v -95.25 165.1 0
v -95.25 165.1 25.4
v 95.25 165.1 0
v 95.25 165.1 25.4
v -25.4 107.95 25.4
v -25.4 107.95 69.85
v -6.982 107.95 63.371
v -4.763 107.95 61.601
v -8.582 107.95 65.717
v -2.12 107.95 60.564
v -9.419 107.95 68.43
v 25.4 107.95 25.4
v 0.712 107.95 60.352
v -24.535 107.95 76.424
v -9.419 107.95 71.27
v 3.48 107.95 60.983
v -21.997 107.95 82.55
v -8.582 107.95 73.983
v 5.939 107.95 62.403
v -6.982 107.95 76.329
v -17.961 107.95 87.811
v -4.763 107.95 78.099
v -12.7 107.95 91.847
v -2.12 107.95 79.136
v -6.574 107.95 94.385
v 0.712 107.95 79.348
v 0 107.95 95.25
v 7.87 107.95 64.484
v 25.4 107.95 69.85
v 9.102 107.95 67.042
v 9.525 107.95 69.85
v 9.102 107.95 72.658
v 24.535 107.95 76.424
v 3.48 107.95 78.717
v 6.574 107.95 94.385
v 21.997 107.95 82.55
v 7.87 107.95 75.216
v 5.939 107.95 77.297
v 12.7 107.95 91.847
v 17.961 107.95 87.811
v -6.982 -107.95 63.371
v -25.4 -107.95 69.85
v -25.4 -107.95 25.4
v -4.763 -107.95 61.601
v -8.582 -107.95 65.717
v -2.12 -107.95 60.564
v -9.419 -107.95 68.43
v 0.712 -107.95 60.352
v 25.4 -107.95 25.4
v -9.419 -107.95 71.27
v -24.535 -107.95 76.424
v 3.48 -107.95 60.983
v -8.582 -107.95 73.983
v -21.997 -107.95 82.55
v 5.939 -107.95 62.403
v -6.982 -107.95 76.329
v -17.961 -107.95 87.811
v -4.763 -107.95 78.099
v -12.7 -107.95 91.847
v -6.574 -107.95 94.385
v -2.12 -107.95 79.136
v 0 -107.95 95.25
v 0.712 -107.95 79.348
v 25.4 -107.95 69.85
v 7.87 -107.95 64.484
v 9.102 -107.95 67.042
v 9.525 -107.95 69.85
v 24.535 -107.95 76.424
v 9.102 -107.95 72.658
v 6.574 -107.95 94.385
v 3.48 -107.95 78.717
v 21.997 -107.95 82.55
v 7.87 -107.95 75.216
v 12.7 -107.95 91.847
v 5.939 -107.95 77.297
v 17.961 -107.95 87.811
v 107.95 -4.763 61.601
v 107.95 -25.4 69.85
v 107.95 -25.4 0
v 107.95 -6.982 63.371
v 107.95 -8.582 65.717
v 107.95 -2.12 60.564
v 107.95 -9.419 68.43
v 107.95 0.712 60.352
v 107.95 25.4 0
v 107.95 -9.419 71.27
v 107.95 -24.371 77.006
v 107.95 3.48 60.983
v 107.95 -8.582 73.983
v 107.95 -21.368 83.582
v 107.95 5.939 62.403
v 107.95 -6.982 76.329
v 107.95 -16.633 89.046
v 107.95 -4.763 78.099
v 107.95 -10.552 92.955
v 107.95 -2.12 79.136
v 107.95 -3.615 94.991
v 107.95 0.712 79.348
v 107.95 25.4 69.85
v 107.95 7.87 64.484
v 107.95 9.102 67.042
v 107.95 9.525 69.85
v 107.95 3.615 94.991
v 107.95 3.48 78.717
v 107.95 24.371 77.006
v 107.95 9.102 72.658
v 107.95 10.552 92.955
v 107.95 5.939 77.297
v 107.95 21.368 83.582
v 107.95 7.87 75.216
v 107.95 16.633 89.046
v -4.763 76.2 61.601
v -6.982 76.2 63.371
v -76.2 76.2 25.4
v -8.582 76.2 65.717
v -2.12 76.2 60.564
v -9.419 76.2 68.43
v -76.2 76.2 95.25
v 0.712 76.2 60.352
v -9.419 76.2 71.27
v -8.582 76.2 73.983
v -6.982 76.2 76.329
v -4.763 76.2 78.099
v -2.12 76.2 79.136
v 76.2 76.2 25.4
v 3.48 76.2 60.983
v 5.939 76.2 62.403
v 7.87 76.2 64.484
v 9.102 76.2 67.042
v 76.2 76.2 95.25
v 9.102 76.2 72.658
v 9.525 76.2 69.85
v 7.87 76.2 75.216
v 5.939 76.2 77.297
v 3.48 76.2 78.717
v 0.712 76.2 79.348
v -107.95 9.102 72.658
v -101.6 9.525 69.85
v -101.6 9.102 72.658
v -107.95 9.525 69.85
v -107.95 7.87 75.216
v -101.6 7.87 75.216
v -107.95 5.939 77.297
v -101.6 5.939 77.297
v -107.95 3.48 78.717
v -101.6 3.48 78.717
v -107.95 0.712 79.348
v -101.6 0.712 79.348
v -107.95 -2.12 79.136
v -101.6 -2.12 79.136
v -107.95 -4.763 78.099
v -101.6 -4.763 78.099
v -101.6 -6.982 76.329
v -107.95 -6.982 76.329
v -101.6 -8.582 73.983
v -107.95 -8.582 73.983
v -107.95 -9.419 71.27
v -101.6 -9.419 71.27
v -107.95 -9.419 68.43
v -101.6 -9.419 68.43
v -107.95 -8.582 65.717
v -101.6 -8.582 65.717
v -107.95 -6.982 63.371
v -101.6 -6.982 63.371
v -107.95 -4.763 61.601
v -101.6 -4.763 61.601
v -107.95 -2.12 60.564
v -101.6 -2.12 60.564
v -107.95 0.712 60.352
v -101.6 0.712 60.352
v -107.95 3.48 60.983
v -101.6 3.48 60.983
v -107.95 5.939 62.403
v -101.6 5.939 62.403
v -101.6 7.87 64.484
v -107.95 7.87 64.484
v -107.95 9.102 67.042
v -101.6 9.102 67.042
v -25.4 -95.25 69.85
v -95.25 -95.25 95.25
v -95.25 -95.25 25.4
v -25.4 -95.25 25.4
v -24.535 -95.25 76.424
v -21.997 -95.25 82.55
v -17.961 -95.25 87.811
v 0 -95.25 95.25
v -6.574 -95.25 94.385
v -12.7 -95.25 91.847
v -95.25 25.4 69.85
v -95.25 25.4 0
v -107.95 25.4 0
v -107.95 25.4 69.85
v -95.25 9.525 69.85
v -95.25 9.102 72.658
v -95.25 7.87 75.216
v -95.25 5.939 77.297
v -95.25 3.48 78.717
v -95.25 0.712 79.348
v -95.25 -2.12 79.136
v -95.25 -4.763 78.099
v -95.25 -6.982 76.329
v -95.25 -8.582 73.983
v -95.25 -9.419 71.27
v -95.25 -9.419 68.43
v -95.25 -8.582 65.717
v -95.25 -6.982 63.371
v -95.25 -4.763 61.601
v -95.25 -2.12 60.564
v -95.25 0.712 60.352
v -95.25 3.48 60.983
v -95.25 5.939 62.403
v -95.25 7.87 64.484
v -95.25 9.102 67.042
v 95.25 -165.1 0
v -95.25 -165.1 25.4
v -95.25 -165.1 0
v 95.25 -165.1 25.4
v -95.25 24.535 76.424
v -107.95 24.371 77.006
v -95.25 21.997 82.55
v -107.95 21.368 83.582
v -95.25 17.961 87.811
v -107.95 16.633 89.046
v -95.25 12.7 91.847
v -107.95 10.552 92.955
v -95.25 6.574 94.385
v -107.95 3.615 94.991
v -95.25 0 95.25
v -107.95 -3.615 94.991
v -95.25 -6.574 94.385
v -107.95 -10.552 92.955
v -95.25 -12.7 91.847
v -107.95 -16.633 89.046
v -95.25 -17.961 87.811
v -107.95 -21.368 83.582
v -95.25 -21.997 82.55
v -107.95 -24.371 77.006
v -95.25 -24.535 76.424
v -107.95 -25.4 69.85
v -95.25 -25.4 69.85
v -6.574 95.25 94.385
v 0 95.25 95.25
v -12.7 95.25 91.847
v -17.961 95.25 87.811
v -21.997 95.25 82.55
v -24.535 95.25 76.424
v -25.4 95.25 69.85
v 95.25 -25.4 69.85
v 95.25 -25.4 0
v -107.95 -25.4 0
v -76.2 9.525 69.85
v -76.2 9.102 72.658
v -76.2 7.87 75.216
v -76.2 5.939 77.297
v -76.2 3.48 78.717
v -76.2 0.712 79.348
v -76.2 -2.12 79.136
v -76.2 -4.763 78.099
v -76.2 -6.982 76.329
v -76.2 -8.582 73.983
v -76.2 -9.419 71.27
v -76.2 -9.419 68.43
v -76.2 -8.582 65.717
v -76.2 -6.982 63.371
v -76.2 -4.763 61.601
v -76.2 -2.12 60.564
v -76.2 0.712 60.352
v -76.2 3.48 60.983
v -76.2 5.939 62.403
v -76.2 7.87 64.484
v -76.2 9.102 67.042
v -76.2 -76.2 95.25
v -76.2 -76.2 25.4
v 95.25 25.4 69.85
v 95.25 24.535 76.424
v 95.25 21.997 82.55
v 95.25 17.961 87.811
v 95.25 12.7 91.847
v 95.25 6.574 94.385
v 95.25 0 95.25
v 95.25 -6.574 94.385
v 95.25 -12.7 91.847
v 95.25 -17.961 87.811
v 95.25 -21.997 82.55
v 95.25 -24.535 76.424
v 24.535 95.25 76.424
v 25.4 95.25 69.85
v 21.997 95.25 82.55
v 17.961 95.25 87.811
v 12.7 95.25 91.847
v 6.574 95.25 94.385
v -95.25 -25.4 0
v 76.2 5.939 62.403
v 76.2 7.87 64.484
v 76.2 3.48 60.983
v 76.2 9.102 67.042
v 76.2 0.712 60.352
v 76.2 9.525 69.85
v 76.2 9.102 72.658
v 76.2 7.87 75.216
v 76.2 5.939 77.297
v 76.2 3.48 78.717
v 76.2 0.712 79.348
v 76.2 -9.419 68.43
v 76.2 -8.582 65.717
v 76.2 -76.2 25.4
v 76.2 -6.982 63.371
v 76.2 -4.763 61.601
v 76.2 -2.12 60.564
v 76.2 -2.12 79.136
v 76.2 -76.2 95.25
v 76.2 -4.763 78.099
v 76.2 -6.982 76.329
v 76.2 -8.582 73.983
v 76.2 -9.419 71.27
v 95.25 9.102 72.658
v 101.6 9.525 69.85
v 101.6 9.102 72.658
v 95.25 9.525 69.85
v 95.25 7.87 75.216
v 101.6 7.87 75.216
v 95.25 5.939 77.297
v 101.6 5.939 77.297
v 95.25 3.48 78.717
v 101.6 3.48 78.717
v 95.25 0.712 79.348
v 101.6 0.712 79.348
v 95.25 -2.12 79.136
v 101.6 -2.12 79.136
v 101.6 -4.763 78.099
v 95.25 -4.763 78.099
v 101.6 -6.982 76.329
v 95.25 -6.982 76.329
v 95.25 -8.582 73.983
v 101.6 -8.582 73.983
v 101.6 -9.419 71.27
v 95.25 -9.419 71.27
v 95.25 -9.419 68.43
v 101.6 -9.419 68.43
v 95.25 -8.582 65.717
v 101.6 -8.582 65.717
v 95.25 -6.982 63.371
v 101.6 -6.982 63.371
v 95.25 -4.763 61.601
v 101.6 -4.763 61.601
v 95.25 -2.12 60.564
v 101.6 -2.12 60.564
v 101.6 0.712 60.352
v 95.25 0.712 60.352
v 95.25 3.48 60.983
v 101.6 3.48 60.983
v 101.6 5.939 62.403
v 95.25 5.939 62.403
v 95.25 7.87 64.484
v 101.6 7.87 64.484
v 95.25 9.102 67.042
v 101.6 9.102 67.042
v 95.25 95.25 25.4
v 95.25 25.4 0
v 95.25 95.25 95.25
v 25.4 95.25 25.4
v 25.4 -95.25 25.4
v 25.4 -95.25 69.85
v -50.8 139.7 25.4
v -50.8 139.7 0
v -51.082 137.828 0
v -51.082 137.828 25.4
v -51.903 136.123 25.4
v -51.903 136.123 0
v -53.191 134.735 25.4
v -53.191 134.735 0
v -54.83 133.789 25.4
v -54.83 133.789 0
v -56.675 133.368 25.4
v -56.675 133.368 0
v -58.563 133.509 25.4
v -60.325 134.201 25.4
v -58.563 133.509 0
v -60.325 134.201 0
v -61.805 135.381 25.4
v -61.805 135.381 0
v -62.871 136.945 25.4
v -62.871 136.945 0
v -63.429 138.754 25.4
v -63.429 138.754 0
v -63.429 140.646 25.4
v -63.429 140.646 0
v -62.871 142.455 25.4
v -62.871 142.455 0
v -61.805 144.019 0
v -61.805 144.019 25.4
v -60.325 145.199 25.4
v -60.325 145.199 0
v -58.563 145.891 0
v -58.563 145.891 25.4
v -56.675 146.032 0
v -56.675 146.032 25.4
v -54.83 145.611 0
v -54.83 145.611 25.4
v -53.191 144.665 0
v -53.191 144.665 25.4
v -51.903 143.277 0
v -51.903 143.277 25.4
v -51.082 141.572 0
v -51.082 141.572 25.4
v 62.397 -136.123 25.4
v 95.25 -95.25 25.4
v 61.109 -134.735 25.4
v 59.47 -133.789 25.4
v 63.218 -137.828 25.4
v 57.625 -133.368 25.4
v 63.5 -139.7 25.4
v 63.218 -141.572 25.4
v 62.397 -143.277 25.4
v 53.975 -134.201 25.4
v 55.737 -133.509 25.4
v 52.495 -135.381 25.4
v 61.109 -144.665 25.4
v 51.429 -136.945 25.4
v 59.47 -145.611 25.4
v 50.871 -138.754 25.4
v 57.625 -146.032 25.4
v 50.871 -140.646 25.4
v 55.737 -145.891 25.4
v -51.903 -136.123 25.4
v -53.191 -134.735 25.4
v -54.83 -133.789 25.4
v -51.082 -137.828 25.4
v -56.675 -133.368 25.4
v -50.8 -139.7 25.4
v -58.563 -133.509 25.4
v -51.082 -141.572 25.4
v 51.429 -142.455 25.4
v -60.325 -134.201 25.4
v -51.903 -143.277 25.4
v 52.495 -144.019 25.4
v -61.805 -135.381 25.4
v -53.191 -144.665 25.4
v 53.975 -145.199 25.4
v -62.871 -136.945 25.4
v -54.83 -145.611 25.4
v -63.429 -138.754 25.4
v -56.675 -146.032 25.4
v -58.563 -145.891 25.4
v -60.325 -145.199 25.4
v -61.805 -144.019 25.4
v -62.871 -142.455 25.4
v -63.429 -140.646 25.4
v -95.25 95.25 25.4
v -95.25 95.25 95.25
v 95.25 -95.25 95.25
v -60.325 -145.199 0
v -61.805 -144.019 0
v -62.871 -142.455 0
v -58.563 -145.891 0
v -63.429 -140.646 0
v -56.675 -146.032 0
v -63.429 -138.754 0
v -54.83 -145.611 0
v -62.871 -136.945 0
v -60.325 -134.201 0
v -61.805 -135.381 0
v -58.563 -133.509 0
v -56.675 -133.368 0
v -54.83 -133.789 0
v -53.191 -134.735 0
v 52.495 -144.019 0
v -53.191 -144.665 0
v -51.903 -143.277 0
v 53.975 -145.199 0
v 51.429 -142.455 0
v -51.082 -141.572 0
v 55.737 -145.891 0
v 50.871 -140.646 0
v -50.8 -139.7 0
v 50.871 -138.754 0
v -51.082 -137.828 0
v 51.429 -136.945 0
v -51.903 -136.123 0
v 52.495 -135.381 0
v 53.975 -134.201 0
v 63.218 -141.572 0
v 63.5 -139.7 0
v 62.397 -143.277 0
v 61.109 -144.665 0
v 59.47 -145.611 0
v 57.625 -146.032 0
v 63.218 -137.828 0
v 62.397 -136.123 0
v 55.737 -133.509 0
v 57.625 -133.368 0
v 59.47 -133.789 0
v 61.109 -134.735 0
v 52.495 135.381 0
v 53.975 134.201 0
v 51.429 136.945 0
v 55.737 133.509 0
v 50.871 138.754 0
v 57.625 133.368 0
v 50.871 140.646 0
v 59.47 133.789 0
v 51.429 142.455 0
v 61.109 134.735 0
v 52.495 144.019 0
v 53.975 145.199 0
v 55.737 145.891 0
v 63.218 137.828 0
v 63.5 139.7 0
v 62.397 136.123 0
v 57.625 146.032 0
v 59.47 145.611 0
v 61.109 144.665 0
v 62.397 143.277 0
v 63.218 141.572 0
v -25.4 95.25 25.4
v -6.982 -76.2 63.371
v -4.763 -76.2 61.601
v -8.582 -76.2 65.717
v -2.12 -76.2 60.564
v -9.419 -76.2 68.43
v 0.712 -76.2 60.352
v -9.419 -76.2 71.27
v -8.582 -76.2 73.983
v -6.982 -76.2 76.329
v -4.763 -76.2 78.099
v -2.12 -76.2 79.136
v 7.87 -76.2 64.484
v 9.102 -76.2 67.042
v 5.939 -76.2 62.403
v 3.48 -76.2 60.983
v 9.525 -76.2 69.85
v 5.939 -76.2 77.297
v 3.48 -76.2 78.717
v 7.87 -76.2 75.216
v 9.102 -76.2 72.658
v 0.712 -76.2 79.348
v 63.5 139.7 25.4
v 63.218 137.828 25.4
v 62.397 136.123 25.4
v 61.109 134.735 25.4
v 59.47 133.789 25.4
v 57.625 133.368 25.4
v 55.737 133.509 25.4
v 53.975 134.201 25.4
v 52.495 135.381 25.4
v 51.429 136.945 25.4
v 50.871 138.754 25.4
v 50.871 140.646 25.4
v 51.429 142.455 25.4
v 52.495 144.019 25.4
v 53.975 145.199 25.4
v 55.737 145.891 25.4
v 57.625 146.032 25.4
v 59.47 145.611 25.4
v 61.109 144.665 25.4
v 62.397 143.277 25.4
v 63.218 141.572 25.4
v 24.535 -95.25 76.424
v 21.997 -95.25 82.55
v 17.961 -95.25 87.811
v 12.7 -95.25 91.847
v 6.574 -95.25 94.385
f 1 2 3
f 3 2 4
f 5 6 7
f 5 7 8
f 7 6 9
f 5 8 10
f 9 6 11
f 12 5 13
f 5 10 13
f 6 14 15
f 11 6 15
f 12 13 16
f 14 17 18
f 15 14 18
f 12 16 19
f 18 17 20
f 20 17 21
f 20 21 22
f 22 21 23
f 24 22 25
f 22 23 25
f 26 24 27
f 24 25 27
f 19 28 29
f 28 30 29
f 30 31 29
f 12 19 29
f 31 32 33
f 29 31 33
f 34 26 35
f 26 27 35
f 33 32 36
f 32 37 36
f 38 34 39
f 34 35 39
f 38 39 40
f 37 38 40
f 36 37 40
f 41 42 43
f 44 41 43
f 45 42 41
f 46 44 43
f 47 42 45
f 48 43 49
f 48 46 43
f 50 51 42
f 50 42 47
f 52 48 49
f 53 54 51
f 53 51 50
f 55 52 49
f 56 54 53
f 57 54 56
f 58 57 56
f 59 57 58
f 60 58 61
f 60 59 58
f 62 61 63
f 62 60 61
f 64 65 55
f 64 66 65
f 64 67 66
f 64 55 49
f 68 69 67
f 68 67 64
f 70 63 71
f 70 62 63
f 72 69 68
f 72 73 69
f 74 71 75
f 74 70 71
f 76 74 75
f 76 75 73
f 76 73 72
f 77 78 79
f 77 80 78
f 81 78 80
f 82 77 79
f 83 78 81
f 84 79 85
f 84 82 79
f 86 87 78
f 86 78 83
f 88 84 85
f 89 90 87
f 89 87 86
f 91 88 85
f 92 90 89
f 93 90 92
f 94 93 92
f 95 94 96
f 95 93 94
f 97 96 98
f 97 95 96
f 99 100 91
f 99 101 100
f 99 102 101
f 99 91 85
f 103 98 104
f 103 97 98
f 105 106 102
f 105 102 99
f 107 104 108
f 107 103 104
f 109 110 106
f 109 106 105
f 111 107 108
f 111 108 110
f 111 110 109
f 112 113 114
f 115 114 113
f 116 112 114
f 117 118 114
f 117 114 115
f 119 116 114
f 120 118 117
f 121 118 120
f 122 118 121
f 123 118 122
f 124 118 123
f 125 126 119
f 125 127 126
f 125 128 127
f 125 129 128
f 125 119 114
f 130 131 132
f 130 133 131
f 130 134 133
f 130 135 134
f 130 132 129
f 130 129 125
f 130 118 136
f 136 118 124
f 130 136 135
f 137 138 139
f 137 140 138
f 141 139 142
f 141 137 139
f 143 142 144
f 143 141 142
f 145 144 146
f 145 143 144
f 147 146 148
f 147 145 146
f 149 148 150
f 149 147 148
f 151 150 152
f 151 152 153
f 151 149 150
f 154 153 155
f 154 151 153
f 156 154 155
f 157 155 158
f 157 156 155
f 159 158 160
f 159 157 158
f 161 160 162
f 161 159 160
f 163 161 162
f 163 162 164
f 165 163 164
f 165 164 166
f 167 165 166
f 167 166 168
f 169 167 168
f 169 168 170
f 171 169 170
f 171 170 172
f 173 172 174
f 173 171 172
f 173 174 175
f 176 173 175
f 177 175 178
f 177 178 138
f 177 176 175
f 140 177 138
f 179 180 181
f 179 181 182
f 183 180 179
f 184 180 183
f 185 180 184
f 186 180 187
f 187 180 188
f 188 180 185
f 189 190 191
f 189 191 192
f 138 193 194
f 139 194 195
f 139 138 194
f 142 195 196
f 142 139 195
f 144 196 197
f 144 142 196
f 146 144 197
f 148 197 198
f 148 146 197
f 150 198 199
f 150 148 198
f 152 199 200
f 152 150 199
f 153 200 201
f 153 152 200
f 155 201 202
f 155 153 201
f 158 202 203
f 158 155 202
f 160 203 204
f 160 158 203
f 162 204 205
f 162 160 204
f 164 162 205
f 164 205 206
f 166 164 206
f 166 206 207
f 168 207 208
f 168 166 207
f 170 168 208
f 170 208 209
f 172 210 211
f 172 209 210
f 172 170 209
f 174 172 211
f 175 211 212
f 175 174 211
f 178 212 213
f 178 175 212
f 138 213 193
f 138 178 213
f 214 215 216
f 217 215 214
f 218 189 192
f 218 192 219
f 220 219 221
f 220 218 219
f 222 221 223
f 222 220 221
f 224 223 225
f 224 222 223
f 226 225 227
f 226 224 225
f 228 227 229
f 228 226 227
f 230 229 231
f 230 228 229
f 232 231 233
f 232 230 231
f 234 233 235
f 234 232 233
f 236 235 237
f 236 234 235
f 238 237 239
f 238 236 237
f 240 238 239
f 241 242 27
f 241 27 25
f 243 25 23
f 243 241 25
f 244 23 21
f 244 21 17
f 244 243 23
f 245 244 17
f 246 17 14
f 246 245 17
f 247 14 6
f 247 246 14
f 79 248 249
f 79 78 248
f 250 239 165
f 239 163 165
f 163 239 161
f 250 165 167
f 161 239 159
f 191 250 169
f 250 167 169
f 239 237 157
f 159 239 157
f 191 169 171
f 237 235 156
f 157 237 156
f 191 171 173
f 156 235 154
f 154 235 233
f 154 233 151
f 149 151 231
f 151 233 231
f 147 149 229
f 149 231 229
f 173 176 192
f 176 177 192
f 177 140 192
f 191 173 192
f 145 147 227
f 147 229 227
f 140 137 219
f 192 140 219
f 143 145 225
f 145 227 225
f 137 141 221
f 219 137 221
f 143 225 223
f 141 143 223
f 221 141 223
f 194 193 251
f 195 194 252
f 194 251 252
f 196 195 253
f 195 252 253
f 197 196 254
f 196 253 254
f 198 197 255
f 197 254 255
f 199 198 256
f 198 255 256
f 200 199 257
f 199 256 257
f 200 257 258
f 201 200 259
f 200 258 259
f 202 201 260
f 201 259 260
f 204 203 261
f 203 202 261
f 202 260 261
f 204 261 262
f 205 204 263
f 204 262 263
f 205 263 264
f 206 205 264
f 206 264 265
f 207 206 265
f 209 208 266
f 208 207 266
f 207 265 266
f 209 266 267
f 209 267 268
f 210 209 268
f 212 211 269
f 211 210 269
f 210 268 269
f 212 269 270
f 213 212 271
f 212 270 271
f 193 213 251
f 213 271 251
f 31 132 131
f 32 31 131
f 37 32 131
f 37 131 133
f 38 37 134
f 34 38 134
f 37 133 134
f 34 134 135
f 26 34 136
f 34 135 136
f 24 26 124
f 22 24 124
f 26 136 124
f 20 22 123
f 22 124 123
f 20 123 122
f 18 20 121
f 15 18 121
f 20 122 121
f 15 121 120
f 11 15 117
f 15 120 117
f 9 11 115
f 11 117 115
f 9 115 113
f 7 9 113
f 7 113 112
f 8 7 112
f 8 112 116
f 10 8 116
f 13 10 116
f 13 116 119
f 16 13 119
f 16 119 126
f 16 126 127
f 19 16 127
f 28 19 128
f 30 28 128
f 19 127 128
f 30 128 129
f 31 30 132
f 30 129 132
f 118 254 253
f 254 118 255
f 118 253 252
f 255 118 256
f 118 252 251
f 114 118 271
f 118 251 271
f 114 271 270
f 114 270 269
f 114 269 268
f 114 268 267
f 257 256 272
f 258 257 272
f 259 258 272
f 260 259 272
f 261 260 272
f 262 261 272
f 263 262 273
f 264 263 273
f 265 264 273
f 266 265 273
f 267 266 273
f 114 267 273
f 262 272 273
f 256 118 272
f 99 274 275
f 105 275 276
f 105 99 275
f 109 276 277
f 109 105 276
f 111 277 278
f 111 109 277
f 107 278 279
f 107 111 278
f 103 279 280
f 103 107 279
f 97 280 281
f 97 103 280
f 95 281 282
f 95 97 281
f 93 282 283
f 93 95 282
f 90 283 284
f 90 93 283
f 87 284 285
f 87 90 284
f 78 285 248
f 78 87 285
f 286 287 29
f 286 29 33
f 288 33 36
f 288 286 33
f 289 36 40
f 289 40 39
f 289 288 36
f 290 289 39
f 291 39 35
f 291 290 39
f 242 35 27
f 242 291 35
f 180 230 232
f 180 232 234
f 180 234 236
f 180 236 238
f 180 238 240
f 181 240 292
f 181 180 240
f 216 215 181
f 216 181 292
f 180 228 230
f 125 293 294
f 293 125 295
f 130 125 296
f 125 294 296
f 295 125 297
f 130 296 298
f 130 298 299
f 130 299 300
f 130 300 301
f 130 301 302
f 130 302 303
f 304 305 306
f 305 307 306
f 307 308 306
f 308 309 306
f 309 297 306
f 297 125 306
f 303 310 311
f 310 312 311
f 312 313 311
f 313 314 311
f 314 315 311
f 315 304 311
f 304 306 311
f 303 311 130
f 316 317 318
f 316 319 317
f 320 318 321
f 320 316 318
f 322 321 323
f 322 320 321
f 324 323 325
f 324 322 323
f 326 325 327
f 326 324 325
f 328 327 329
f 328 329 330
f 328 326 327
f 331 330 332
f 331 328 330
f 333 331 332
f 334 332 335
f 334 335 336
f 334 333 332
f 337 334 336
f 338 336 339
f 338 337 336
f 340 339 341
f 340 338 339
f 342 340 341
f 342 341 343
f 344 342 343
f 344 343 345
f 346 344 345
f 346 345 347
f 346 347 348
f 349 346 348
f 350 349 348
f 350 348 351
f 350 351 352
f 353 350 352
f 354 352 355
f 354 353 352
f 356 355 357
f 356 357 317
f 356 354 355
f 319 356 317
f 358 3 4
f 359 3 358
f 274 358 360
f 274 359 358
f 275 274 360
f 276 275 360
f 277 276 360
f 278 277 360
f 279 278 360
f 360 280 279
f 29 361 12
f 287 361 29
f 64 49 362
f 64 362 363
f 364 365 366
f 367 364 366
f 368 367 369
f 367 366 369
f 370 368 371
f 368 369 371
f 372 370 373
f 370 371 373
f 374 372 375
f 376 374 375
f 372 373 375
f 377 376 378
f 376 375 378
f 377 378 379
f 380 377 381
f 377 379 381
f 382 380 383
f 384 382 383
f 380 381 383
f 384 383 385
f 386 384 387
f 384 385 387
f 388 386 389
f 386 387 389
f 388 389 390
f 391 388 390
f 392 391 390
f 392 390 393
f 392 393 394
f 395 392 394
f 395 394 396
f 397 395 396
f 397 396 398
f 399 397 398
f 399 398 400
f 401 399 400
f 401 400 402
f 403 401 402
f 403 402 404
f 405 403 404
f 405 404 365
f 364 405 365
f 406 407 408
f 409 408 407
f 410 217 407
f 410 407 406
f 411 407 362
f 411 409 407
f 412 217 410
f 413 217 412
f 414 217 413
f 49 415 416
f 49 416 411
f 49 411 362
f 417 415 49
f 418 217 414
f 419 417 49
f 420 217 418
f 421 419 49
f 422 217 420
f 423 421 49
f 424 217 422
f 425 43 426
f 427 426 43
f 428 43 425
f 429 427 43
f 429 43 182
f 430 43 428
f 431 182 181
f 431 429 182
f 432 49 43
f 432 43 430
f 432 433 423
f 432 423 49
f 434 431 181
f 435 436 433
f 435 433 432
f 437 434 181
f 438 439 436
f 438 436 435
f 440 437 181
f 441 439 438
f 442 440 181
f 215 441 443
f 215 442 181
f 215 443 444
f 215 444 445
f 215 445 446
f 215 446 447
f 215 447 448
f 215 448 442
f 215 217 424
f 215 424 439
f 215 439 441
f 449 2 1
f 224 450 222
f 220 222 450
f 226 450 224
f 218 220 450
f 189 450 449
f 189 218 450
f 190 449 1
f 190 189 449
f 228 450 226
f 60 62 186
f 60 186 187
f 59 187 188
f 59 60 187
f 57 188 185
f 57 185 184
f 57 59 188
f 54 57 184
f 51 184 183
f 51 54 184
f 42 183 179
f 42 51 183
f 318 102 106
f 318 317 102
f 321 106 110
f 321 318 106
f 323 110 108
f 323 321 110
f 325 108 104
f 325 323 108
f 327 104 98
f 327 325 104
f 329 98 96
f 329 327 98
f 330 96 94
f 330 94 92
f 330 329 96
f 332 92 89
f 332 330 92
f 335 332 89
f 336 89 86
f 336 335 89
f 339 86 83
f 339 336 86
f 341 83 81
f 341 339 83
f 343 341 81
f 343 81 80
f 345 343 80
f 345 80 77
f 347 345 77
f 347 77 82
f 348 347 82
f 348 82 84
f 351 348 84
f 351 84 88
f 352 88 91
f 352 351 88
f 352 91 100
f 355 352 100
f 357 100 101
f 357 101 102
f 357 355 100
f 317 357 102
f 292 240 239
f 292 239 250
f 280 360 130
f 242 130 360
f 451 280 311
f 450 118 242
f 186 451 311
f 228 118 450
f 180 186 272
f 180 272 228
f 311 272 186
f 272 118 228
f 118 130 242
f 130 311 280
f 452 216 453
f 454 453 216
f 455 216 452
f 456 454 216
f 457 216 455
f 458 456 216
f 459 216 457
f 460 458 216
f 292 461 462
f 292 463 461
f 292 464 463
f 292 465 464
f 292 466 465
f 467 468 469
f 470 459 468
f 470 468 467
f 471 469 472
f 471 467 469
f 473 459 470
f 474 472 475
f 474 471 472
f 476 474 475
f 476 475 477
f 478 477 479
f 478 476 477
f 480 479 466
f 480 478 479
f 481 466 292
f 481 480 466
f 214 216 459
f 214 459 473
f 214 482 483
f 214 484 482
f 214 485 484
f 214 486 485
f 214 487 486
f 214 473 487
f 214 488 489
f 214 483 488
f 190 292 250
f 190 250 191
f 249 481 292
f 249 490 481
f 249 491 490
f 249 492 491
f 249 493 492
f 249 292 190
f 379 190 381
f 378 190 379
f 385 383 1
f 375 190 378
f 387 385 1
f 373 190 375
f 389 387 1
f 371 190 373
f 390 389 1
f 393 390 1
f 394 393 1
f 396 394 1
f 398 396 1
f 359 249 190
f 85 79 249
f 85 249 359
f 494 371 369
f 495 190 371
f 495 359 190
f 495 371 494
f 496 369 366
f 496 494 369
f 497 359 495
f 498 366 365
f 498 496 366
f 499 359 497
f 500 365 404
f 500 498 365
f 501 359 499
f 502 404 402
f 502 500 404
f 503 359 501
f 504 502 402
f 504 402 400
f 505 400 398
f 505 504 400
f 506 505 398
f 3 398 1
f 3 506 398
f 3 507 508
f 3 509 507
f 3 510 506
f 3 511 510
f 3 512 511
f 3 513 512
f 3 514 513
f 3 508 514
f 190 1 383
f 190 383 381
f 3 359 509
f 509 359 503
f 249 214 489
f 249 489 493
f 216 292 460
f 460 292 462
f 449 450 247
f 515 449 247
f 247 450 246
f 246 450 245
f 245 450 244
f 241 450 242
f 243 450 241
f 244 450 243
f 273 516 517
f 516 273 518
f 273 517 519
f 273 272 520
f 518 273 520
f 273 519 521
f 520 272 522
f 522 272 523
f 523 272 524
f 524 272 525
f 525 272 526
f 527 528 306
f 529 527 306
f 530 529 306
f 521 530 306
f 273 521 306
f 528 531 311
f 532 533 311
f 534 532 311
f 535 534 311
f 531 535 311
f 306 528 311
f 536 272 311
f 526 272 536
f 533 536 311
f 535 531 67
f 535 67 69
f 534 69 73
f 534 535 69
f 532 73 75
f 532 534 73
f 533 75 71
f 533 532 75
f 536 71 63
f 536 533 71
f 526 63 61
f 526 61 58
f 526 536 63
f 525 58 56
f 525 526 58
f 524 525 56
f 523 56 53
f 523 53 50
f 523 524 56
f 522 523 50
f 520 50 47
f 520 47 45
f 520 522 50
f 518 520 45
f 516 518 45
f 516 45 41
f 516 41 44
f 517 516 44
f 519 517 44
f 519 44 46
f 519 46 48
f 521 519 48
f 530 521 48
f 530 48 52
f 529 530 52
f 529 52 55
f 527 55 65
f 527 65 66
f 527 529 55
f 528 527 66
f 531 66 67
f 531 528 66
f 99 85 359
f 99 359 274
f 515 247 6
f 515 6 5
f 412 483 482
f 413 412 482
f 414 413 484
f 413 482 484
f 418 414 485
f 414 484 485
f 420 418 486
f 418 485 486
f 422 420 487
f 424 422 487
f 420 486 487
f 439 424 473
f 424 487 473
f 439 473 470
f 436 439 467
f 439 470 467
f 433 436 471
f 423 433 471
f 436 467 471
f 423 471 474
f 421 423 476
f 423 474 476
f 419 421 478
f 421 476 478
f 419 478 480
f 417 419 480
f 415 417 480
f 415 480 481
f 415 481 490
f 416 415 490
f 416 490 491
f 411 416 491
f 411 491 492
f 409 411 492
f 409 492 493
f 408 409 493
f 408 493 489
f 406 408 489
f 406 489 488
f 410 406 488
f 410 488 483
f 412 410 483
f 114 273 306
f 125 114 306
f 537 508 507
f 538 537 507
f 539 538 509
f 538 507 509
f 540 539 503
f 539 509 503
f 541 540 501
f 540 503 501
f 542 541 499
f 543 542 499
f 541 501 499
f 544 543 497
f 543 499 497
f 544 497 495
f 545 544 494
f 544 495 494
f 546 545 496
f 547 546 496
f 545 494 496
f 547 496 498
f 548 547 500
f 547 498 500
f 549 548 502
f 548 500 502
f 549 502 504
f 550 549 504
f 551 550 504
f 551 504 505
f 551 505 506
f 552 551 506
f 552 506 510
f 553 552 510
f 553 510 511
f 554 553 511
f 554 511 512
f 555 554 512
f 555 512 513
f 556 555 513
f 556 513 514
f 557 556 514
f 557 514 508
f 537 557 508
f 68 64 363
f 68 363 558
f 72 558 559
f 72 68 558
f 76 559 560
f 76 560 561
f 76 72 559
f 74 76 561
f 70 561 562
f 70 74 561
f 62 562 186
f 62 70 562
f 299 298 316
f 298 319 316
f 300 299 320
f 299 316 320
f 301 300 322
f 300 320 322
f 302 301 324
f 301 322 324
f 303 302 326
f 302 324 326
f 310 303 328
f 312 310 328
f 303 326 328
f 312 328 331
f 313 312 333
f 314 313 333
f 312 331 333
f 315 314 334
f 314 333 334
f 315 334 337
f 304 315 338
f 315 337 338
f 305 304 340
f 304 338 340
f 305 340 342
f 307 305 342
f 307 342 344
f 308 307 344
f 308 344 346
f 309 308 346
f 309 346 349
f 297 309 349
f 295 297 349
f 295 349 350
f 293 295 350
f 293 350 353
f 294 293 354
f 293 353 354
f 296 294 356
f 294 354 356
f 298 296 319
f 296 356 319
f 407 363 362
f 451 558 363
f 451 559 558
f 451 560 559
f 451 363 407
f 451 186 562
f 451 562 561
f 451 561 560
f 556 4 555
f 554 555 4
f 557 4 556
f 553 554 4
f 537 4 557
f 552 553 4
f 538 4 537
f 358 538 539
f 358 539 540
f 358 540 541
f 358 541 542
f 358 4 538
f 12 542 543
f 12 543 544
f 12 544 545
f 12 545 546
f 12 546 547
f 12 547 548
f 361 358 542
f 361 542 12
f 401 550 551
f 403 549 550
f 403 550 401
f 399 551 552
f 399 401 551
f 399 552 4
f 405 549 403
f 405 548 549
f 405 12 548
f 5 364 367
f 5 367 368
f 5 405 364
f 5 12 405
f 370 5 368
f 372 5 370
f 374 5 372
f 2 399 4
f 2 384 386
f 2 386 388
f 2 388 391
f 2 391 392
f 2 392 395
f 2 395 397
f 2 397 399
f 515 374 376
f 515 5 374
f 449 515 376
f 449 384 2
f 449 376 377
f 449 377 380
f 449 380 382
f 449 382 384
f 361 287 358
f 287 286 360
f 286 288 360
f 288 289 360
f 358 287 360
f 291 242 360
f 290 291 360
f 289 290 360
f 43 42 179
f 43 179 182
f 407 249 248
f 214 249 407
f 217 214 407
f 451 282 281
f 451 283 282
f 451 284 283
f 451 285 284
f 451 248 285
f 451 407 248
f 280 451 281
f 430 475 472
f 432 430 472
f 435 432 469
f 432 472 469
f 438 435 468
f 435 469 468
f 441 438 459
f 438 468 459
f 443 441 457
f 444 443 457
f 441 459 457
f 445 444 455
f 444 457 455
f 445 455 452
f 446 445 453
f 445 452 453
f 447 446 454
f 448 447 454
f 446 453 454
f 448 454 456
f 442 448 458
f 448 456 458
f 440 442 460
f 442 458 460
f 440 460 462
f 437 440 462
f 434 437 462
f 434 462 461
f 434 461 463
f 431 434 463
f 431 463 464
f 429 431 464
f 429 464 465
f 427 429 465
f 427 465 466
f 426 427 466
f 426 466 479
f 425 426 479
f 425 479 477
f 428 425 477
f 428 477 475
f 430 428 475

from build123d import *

# Parameters (mm, degrees)
F1_DEPTH = 165.1
F0_W     = 19.05
F0_H     = 69.85
F0_R     = 9.525
F2_DEPTH = 95.25
F3_DEPTH = 107.95
F4_R     = 9.525
F5_DEPTH = 107.95
F6_DEPTH = 76.2
F7_DEPTH = 101.6
F8_R     = 6.35
F9_DEPTH = 95.251


with BuildPart() as f1:
    # F0 (on Front) → F1 (new body, symmetric)
    with BuildSketch(Plane.XZ):
        Polygon((-76.2, 25.4), (-95.25, 25.4), (-95.25, 0), (95.25, 0), (95.25, 25.4), (76.2, 25.4), (25.4, 25.4), (-25.4, 25.4), align=None)
    extrude(amount=F1_DEPTH, both=True)

    # F0 (on Front) → F2 (join, symmetric)
    with BuildSketch(Plane.XZ):
        with Locations((-85.725, 60.325)):
            Rectangle(F0_W, F0_H)
        with BuildLine():
            Line((-76.2, 95.25), (-76.2, 25.4))
            Line((-76.2, 25.4), (-25.4, 25.4))
            Line((-25.4, 25.4), (-25.4, 69.85))
            ThreePointArc((-25.4, 69.85), (-17.9605122421, 87.8105122421), (0, 95.25))
            Line((0, 95.25), (-76.2, 95.25))
        make_face()
        with BuildLine():
            Line((-25.4, 69.85), (-25.4, 25.4))
            Line((-25.4, 25.4), (25.4, 25.4))
            Line((25.4, 25.4), (25.4, 69.85))
            ThreePointArc((25.4, 69.85), (17.9605122421, 87.8105122421), (0, 95.25))
            ThreePointArc((0, 95.25), (-17.9605122421, 87.8105122421), (-25.4, 69.85))
        make_face()
        with Locations((0, 69.85)):
            Circle(F0_R, mode=Mode.SUBTRACT)
        with BuildLine():
            Line((25.4, 69.85), (25.4, 25.4))
            Line((25.4, 25.4), (76.2, 25.4))
            Line((76.2, 25.4), (76.2, 95.25))
            Line((76.2, 95.25), (0, 95.25))
            ThreePointArc((0, 95.25), (17.9605122421, 87.8105122421), (25.4, 69.85))
        make_face()
        with Locations((85.725, 60.325)):
            Rectangle(F0_W, F0_H)
    extrude(amount=F2_DEPTH, both=True)

    # F0 (on Front) → F3 (join, symmetric)
    with BuildSketch(Plane.XZ):
        with BuildLine():
            Line((-25.4, 69.85), (-25.4, 25.4))
            Line((-25.4, 25.4), (25.4, 25.4))
            Line((25.4, 25.4), (25.4, 69.85))
            ThreePointArc((25.4, 69.85), (17.9605122421, 87.8105122421), (0, 95.25))
            ThreePointArc((0, 95.25), (-17.9605122421, 87.8105122421), (-25.4, 69.85))
        make_face()
        with Locations((0, 69.85)):
            Circle(F0_R, mode=Mode.SUBTRACT)
    extrude(amount=F3_DEPTH, both=True)

    # F4 (on Right) → F5 (join, symmetric)
    with BuildSketch(Plane.YZ):
        with BuildLine():
            Line((25.4, 0), (25.4, 69.85))
            ThreePointArc((25.4, 69.85), (0, 95.25), (-25.4, 69.85))
            Line((-25.4, 69.85), (-25.4, 0))
            Line((-25.4, 0), (25.4, 0))
        make_face()
        with Locations((0, 69.85)):
            Circle(F4_R, mode=Mode.SUBTRACT)
    extrude(amount=F5_DEPTH, both=True)

    # F0 (on Front) → F6 (cut, symmetric)
    with BuildSketch(Plane.XZ):
        with BuildLine():
            Line((-76.2, 95.25), (-76.2, 25.4))
            Line((-76.2, 25.4), (-25.4, 25.4))
            Line((-25.4, 25.4), (-25.4, 69.85))
            ThreePointArc((-25.4, 69.85), (-17.9605122421, 87.8105122421), (0, 95.25))
            Line((0, 95.25), (-76.2, 95.25))
        make_face()
        with BuildLine():
            Line((-25.4, 69.85), (-25.4, 25.4))
            Line((-25.4, 25.4), (25.4, 25.4))
            Line((25.4, 25.4), (25.4, 69.85))
            ThreePointArc((25.4, 69.85), (17.9605122421, 87.8105122421), (0, 95.25))
            ThreePointArc((0, 95.25), (-17.9605122421, 87.8105122421), (-25.4, 69.85))
        make_face()
        with Locations((0, 69.85)):
            Circle(F0_R, mode=Mode.SUBTRACT)
        with BuildLine():
            Line((25.4, 69.85), (25.4, 25.4))
            Line((25.4, 25.4), (76.2, 25.4))
            Line((76.2, 25.4), (76.2, 95.25))
            Line((76.2, 95.25), (0, 95.25))
            ThreePointArc((0, 95.25), (17.9605122421, 87.8105122421), (25.4, 69.85))
        make_face()
        with Locations((0, 69.85)):
            Circle(F0_R)
    extrude(amount=F6_DEPTH, both=True, mode=Mode.SUBTRACT)

    # F4 (on Right) → F7 (cut, symmetric)
    with BuildSketch(Plane.YZ):
        with Locations((0, 69.85)):
            Circle(F4_R)
    extrude(amount=F7_DEPTH, both=True, mode=Mode.SUBTRACT)

    # F8 (on face) → F9 (cut, through all)
    with BuildSketch(Plane(origin=(0, 0, 0), x_dir=(1, 0, 0), z_dir=(0, 0, -1))):
        with Locations((-57.15, 139.7)):
            Circle(F8_R)
        with Locations((57.15, 139.7)):
            Circle(F8_R)
        with Locations((57.15, -139.7)):
            Circle(F8_R)
        with Locations((-57.15, -139.7)):
            Circle(F8_R)
    extrude(amount=-F9_DEPTH, mode=Mode.SUBTRACT)


solid = f1.part
